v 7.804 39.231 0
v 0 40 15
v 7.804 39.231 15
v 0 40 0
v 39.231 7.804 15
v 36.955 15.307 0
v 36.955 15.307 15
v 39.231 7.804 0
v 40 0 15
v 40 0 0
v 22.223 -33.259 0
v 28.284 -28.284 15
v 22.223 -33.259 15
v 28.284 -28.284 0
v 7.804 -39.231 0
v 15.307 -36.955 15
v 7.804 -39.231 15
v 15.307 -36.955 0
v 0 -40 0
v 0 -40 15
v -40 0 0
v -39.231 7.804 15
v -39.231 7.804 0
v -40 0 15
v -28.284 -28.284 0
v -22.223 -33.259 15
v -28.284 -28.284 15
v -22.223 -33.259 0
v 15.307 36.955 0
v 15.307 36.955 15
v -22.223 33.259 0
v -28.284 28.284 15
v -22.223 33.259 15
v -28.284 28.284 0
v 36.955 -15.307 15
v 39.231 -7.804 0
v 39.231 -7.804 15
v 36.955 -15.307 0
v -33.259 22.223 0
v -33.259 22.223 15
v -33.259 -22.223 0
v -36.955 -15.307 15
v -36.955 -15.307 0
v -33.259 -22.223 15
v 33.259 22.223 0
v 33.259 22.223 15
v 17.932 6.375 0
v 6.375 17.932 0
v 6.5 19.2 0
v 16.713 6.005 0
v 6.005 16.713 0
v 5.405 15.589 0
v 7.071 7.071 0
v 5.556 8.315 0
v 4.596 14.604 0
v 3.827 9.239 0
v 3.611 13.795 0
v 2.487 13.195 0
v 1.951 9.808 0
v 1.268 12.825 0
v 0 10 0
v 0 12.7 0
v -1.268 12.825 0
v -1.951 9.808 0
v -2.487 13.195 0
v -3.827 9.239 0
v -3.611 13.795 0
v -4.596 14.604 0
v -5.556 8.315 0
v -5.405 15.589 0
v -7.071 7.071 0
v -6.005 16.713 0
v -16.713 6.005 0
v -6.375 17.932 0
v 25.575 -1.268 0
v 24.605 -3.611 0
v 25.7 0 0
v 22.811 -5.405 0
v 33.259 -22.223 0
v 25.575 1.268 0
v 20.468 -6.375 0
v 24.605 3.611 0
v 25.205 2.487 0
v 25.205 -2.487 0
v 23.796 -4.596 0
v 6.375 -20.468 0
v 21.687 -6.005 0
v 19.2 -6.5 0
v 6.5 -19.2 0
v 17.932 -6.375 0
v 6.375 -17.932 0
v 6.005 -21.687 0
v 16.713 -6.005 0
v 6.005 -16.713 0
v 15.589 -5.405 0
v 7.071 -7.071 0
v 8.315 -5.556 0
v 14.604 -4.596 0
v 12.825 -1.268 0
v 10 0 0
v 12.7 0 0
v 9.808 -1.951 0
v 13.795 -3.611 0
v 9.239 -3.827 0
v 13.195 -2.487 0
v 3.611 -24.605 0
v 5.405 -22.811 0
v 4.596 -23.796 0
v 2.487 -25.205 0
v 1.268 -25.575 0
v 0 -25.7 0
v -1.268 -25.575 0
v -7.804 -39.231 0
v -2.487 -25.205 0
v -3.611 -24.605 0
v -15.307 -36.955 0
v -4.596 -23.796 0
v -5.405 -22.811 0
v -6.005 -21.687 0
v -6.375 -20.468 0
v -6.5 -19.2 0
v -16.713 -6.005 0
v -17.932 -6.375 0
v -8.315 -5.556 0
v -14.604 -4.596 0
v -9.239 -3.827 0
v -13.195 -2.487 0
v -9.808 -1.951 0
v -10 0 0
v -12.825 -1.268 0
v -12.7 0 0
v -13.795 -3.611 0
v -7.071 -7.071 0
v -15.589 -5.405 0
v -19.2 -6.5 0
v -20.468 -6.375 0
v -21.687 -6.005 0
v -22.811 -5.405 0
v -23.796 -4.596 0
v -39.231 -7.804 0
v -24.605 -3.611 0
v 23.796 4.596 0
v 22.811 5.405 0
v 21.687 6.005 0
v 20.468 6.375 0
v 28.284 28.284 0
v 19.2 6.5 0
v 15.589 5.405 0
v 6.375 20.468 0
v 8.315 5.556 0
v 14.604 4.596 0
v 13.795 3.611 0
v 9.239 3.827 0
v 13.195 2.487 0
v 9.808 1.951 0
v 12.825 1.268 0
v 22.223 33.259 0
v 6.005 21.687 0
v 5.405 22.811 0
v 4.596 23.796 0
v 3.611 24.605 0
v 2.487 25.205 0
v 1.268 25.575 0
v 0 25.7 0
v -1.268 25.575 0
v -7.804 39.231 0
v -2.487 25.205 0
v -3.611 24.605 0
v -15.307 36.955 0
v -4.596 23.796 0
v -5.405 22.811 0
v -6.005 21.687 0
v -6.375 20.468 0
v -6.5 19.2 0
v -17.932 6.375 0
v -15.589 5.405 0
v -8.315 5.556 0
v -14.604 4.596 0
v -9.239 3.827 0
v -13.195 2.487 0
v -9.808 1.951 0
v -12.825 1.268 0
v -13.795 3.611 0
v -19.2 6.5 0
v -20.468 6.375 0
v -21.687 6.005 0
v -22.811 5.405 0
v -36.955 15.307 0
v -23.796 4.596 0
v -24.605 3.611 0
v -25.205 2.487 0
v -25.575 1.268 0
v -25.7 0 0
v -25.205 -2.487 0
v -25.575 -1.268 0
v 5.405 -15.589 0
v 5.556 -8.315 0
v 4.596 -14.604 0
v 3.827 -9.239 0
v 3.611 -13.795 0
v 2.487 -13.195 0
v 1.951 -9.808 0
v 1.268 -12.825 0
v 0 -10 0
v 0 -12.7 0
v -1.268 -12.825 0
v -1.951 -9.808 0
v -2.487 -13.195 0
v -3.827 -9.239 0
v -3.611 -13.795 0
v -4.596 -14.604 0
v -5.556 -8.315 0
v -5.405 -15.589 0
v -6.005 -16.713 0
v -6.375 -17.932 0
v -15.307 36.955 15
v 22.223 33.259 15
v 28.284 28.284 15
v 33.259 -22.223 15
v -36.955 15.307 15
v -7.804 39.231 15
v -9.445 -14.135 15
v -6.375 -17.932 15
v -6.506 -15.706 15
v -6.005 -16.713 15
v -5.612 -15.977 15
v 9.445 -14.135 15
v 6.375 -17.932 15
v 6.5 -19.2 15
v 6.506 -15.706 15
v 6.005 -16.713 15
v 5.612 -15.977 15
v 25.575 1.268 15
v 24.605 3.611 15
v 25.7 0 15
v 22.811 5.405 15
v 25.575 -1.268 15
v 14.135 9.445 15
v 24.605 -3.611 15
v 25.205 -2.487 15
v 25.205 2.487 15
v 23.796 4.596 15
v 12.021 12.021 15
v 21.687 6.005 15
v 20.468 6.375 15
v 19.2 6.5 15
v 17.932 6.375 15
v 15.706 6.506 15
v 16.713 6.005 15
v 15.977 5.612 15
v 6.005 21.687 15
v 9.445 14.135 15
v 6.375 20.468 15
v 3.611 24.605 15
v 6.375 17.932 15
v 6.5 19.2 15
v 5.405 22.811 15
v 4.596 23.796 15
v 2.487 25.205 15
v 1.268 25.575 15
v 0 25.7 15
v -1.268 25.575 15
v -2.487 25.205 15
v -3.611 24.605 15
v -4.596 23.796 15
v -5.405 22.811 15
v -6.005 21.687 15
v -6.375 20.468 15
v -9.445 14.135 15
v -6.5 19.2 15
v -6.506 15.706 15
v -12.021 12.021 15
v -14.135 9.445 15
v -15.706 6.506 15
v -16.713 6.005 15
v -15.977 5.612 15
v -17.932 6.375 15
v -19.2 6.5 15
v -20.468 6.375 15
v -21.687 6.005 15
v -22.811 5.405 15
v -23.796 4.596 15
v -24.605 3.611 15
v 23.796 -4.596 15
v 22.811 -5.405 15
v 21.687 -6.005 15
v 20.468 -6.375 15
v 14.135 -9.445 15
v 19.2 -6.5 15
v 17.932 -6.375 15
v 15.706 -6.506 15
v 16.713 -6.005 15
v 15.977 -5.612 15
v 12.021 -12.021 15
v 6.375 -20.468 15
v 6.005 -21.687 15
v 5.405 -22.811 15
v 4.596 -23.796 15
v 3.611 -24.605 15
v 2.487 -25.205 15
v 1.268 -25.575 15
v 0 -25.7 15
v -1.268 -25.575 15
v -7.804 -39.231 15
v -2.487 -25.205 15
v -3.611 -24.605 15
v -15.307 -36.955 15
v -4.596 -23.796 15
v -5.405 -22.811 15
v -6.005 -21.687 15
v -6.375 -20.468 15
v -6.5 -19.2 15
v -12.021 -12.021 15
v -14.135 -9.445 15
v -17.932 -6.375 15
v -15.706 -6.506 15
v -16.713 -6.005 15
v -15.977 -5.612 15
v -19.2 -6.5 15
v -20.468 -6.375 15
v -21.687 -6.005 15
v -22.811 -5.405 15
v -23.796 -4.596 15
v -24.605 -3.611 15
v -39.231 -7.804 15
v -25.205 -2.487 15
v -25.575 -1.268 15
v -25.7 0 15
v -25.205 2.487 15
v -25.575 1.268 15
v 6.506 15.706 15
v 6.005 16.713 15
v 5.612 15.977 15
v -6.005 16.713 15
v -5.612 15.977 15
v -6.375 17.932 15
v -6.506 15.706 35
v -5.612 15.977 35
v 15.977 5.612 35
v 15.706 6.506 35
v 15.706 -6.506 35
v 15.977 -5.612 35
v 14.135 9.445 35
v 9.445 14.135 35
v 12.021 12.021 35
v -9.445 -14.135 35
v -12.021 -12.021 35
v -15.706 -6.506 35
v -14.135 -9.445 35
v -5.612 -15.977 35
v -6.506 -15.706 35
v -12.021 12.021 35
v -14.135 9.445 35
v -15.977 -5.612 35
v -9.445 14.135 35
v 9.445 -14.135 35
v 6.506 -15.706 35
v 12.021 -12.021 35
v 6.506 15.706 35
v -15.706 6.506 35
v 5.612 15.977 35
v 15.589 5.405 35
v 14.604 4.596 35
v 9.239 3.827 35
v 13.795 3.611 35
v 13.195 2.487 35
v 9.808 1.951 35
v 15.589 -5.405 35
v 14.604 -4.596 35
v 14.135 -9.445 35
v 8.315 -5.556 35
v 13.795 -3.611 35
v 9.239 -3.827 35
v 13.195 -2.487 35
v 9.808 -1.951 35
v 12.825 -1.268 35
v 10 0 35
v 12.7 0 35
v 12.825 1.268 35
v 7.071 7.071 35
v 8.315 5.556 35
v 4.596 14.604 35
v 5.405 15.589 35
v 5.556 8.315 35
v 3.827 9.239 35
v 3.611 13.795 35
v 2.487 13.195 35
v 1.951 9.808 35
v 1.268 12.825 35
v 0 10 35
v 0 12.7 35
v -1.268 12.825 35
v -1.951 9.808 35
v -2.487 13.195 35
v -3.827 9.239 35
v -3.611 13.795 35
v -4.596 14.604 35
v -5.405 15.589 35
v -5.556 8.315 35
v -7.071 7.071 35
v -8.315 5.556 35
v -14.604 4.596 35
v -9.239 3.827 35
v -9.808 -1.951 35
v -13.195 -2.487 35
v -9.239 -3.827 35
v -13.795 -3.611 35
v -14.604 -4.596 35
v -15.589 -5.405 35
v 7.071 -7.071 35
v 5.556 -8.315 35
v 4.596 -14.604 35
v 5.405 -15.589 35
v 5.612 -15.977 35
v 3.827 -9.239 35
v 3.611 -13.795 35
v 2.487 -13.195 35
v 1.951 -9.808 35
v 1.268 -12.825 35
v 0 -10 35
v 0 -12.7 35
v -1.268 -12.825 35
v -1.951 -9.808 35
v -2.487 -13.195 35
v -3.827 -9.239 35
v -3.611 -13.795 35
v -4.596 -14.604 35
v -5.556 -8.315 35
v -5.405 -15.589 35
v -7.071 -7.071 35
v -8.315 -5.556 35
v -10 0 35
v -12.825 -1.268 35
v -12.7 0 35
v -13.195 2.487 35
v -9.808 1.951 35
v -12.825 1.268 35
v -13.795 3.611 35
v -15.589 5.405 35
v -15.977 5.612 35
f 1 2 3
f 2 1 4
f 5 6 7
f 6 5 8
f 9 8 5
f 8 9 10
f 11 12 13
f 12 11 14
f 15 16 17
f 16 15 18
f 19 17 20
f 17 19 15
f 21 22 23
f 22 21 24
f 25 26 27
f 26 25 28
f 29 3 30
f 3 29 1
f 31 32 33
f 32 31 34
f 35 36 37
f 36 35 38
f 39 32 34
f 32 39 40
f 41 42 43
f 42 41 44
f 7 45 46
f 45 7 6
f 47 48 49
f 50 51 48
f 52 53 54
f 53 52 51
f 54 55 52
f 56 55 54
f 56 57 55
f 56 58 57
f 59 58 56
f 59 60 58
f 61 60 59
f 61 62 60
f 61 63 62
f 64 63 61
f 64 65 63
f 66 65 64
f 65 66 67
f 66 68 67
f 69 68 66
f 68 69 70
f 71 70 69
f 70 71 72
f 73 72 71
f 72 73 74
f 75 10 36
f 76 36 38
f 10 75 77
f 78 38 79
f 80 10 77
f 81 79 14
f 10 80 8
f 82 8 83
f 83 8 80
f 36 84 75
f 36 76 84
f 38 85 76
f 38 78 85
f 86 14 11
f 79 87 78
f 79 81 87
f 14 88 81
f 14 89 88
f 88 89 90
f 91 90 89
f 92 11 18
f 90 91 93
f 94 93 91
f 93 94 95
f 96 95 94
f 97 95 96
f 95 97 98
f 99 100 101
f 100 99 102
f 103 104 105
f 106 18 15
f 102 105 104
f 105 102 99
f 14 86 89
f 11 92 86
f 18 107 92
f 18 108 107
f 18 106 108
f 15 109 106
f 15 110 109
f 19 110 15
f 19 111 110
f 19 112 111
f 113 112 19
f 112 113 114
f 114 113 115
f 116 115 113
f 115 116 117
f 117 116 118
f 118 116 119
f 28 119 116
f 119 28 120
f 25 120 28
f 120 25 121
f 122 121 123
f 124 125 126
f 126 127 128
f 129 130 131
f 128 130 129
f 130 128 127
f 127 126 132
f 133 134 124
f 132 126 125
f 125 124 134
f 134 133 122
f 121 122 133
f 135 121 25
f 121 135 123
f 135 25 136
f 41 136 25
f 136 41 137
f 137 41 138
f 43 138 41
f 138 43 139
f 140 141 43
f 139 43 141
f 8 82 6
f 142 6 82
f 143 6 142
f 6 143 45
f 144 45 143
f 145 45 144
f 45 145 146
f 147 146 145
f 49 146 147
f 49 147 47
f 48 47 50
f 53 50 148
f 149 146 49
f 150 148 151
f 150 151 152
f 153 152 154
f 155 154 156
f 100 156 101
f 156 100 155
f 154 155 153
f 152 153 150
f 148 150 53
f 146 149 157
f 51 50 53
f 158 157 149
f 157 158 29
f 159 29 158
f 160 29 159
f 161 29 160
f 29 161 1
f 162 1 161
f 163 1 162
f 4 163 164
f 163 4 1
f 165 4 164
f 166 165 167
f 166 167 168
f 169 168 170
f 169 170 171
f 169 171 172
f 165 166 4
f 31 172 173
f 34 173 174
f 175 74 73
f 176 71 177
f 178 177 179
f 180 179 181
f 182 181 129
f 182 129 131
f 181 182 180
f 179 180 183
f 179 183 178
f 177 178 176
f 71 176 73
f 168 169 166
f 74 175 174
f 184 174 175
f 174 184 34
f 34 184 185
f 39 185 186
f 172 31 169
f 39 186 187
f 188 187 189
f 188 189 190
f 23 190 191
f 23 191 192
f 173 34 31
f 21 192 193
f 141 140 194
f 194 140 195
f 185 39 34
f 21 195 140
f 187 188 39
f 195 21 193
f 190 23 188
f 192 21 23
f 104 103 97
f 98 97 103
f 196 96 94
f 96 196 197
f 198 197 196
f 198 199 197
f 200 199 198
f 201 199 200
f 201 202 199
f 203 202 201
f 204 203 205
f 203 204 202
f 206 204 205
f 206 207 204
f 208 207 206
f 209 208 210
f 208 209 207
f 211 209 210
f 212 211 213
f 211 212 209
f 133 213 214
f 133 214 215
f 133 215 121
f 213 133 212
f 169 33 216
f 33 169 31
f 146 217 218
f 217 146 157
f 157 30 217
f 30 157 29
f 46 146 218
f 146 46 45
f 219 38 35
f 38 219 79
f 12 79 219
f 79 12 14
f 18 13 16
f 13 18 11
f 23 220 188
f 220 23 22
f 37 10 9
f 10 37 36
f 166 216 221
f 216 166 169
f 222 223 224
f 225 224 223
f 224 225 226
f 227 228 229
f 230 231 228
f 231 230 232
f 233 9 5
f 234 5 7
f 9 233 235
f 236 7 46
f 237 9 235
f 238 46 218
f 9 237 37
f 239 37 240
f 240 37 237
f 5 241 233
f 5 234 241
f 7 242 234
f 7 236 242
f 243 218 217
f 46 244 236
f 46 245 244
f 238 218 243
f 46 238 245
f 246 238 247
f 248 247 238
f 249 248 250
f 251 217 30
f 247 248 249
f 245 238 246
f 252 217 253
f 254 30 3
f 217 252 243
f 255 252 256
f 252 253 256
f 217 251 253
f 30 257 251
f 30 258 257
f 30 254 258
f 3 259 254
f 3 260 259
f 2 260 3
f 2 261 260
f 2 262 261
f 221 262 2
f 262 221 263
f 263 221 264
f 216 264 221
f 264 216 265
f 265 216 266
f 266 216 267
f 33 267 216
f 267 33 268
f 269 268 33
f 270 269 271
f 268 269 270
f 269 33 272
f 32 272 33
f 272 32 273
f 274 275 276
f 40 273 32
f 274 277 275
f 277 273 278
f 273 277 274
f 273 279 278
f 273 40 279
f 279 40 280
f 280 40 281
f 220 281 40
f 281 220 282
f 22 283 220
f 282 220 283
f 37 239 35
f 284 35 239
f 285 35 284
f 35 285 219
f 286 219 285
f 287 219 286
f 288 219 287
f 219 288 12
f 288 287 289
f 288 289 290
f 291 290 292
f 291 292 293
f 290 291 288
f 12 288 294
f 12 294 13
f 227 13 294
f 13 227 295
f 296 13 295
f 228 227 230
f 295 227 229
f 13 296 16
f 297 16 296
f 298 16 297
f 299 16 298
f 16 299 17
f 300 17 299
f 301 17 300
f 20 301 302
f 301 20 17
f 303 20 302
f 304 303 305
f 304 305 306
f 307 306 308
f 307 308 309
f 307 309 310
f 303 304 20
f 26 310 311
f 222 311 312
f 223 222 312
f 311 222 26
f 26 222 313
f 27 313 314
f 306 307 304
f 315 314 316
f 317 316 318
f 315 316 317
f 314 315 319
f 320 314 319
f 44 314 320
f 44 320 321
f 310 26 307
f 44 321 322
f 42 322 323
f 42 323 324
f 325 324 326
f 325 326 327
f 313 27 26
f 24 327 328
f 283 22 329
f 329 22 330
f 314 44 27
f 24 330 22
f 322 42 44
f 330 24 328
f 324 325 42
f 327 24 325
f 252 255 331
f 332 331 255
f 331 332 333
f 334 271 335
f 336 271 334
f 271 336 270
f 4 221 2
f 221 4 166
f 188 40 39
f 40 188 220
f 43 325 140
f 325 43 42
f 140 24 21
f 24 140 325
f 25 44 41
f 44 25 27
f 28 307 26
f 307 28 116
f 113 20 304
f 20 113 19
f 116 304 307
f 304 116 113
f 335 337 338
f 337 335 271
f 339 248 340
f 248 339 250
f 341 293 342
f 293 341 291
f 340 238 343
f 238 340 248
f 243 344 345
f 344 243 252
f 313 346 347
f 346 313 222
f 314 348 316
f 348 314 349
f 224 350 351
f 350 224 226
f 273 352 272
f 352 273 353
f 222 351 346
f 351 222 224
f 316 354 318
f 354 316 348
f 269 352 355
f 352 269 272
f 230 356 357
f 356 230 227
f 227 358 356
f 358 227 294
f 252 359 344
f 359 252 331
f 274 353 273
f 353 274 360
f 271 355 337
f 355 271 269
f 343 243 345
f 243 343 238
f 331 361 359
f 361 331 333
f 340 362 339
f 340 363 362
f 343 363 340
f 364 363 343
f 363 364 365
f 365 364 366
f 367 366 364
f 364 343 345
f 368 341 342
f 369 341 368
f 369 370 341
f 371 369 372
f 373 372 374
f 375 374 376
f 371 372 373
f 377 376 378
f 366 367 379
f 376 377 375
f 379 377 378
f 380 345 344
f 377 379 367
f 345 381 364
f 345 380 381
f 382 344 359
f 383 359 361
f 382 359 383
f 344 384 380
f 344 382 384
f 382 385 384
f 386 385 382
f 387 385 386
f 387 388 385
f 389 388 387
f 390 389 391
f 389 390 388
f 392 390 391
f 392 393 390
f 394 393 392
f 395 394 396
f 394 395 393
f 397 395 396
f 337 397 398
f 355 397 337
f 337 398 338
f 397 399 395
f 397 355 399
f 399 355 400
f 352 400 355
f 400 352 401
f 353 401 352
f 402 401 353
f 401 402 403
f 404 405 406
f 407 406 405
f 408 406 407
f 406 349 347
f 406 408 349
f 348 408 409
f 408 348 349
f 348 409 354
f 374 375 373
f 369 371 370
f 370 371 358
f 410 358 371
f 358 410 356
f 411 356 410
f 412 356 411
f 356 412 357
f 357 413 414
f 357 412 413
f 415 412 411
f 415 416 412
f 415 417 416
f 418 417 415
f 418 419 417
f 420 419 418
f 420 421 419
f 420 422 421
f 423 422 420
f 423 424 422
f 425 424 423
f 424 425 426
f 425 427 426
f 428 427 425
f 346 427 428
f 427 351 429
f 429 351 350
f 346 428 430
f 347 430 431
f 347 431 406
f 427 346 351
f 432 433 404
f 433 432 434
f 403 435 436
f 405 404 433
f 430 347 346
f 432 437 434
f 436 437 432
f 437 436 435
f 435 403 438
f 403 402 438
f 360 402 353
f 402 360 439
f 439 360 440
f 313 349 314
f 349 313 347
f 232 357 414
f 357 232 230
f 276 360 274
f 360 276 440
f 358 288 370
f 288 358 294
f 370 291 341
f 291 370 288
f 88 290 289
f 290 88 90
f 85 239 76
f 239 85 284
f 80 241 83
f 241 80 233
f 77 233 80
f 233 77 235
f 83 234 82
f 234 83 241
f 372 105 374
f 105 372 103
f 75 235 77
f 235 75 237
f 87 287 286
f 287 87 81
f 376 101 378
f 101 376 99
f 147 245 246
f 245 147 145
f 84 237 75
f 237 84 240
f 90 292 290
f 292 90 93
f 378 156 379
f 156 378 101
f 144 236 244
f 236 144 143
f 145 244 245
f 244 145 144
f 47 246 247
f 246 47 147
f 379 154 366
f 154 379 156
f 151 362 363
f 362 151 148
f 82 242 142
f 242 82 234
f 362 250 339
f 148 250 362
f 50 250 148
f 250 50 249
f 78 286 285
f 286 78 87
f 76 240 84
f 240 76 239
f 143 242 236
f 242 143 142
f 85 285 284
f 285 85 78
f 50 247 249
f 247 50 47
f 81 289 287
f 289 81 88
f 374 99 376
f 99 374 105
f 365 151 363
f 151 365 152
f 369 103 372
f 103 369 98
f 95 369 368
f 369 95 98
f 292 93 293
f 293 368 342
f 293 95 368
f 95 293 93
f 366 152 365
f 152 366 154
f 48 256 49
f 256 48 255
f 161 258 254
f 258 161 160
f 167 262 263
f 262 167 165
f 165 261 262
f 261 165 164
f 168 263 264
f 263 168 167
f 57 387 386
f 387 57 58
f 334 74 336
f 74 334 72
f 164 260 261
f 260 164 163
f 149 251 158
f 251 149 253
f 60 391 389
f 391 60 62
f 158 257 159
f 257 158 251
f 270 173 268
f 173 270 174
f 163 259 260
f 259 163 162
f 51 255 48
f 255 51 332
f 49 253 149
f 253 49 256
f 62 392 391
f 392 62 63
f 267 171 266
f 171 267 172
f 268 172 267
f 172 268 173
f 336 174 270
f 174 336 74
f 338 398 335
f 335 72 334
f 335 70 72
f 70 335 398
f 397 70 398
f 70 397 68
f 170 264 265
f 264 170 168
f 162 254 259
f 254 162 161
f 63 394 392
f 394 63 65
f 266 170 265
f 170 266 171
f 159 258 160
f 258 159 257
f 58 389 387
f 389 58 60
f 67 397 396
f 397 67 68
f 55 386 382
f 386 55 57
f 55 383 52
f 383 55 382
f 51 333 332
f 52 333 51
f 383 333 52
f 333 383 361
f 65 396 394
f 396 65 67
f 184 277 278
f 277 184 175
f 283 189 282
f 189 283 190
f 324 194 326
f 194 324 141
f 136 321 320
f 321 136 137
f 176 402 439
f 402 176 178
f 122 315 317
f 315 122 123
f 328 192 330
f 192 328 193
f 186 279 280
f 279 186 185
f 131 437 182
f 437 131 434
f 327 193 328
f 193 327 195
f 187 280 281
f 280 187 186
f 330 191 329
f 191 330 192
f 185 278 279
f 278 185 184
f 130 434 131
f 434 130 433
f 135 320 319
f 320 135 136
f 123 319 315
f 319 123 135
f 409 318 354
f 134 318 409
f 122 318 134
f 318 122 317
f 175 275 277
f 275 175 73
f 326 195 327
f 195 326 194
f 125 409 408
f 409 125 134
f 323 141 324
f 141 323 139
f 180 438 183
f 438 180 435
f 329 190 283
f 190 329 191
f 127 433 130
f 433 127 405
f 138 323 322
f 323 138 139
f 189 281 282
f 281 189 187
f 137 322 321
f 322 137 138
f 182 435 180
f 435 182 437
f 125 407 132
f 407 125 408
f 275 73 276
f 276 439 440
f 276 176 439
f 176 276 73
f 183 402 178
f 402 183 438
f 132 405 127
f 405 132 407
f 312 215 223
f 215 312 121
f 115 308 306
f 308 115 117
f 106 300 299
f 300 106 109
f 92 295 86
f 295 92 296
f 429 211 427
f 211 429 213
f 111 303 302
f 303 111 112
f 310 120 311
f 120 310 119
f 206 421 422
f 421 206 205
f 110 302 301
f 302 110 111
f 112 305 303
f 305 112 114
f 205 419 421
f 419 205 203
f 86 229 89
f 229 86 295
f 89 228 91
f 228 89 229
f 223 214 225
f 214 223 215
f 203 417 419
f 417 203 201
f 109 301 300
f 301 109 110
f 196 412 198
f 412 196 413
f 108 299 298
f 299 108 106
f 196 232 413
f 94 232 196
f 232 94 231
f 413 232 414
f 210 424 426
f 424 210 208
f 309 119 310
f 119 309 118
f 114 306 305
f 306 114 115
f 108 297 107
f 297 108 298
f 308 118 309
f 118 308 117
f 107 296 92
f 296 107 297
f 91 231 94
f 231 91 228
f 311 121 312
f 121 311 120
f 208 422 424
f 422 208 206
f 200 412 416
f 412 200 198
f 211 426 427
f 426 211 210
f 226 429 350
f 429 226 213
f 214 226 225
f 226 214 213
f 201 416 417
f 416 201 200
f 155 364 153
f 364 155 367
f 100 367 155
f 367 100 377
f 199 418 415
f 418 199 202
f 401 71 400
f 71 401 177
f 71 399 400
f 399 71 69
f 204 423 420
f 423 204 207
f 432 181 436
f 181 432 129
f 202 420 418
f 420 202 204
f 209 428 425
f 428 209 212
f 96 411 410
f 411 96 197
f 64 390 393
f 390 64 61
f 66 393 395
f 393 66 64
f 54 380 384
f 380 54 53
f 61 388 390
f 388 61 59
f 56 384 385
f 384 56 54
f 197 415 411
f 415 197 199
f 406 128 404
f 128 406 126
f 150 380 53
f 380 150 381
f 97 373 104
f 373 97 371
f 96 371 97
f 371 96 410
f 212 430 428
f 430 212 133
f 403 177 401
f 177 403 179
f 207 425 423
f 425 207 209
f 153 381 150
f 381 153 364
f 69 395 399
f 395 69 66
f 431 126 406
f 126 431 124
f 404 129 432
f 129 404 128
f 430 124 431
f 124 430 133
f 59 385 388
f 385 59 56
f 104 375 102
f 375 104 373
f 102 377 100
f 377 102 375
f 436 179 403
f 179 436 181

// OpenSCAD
$fn = 32;

// ----------------------------------------------------------------------
// Bolt-circle flange: 80 mm outside, 4 bolt holes, bore 20 mm
// ----------------------------------------------------------------------

// --- parameters (mm) ---
flange_d = 80;            // flange outside diameter
flange_t = 15;            // flange thickness
bolts = 4;                // number of bolt holes
bolt_d = 13;              // bolt clearance
bolt_r = 19.2;            // bolt circle radius
bore_d = 20;              // centre bore
hub_d = 34;               // raised hub diameter
hub_h = 20;               // raised hub height

module body() {
  cylinder(h = flange_t, d = flange_d);
  /* raised hub, sunk 1 mm into the flange */
  translate([0, 0, flange_t - 1]) cylinder(h = hub_h + 1, d = hub_d);
}

difference() {
  body();
  /* bolt circle */
  for (i = [0 : bolts - 1]) rotate([0, 0, i * 360 / bolts]) translate([bolt_r, 0, -1]) cylinder(h = flange_t + hub_h + 3, d = bolt_d);
  translate([0, 0, -1]) cylinder(h = flange_t + hub_h + 3, d = bore_d);
}
